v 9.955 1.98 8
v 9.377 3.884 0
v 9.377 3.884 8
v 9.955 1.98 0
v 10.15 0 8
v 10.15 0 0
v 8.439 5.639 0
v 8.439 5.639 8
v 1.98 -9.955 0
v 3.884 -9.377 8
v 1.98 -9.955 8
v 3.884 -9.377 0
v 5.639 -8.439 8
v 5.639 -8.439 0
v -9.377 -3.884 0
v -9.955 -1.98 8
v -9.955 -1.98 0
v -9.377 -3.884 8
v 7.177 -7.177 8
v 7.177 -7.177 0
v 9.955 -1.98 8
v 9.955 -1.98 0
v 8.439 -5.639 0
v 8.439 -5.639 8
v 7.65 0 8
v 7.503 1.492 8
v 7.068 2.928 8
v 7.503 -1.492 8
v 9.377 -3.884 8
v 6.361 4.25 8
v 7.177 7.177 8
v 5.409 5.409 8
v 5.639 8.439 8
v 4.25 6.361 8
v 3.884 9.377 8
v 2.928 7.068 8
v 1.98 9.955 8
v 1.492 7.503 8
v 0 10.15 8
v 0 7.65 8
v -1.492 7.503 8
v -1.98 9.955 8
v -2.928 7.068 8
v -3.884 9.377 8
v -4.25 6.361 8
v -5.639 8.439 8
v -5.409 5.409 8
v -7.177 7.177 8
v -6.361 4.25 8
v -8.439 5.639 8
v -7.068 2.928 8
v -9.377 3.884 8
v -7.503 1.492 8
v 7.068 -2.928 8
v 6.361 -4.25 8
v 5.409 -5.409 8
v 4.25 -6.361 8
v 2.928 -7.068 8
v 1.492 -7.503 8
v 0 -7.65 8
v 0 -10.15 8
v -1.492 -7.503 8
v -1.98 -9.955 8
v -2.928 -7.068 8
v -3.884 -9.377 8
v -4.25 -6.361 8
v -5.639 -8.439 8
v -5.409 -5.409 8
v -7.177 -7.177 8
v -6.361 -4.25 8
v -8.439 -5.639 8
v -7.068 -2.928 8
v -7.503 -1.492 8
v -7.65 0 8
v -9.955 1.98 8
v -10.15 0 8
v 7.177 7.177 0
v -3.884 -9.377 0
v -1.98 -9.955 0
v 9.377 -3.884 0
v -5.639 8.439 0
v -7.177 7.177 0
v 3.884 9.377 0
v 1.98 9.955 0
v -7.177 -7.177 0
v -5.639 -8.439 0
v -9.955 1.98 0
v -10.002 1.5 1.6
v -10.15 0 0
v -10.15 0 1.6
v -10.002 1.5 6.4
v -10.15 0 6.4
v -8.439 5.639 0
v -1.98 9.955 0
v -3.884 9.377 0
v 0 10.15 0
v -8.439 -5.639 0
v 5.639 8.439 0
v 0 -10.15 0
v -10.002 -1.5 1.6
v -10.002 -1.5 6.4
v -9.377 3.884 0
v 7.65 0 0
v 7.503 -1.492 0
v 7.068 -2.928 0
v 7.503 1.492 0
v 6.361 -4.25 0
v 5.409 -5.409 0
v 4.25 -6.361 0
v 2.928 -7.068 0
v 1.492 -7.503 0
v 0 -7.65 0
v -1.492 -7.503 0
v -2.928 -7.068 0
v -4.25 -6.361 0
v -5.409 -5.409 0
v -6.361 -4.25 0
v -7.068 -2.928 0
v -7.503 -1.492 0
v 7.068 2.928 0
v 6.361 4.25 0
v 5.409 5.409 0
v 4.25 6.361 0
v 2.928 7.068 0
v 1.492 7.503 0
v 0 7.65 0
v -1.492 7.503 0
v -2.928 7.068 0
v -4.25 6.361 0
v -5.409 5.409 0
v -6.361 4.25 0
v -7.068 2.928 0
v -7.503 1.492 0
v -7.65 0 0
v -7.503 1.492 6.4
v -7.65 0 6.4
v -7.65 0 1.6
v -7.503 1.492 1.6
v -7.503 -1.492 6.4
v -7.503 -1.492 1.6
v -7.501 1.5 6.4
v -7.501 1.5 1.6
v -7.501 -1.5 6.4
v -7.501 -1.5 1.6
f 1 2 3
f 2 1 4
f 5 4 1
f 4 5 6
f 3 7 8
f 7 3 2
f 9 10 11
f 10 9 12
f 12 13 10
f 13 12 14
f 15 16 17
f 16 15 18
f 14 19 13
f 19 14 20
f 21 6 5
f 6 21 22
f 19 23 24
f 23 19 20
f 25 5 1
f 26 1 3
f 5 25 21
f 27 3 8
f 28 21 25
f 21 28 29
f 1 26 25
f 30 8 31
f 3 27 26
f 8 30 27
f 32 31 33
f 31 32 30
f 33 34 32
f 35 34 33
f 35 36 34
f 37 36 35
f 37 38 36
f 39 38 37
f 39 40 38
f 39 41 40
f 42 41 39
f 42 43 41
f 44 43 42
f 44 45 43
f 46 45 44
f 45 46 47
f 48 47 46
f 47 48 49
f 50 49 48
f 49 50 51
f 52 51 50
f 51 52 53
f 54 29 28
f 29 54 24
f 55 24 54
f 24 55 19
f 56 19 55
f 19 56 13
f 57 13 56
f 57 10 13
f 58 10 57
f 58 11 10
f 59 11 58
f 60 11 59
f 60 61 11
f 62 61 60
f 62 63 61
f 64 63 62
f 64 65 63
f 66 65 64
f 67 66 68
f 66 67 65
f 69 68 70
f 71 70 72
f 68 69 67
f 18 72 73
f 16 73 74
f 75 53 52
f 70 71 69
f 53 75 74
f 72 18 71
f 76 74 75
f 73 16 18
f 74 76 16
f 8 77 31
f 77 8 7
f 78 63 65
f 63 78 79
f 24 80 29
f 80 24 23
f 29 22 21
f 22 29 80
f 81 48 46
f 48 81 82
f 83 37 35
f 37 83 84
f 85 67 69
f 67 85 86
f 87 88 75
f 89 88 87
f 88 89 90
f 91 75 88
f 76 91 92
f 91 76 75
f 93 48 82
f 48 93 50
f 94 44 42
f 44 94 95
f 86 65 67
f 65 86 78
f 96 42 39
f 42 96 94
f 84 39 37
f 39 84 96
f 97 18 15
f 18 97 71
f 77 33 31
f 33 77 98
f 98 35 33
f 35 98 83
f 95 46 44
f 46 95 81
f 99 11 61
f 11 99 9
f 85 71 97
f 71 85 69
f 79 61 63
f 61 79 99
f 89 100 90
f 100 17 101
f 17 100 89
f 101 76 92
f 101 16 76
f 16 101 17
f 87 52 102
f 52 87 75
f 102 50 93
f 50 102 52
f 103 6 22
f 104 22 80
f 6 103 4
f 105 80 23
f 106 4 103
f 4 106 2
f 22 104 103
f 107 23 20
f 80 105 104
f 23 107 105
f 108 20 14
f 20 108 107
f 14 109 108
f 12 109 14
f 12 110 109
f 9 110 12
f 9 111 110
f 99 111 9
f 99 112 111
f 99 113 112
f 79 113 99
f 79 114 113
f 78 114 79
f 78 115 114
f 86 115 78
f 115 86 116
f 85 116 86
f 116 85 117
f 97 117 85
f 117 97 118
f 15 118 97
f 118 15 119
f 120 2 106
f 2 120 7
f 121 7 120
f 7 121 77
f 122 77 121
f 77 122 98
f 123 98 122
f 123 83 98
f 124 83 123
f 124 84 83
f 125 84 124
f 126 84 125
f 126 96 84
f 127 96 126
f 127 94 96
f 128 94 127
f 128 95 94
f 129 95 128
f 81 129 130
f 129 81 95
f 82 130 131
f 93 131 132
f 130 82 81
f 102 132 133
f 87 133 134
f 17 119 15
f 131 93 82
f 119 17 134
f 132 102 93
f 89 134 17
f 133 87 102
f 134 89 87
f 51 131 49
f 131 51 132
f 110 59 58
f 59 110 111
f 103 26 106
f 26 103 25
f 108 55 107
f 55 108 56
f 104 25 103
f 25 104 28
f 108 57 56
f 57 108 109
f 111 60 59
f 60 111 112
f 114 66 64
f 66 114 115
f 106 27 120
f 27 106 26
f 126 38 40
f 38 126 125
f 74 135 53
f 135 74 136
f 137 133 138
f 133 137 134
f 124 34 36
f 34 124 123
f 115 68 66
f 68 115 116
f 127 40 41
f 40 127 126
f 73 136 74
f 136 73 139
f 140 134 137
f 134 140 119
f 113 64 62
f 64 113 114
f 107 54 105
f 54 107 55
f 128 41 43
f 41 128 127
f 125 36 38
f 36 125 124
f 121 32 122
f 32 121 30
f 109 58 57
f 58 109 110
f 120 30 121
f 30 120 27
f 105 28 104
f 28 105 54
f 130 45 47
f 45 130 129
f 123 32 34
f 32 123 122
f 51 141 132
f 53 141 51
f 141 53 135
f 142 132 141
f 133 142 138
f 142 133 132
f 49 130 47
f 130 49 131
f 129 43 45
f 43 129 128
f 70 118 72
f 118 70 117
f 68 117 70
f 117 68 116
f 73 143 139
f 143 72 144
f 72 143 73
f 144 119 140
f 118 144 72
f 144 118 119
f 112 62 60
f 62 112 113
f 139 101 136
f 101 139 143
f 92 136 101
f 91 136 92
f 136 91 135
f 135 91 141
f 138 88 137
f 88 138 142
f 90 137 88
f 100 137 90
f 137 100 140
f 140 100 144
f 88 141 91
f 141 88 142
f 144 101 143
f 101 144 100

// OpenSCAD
$fn = 32;

// ----------------------------------------------------------------------
// Spacer sleeve: 20.3 / 15.3 x 8 mm
// ----------------------------------------------------------------------

// --- parameters (mm) ---
tube_d = 20.3;            // outside diameter
bore_d = 15.3;            // shaft bore
tube_l = 8;               // sleeve length
slot_w = 3;               // clamp slot width
slot_len = 4.8;           // clamp slot length

module sleeve() {
  cylinder(h = tube_l, d = tube_d);
}

difference() {
  sleeve();
  translate([0, 0, -1]) cylinder(h = tube_l + 2, d = bore_d);
  translate([-tube_d / 2 - 1, -slot_w / 2, tube_l / 2 - slot_len / 2]) cube([tube_d / 2 + 1, slot_w, slot_len]);
}
